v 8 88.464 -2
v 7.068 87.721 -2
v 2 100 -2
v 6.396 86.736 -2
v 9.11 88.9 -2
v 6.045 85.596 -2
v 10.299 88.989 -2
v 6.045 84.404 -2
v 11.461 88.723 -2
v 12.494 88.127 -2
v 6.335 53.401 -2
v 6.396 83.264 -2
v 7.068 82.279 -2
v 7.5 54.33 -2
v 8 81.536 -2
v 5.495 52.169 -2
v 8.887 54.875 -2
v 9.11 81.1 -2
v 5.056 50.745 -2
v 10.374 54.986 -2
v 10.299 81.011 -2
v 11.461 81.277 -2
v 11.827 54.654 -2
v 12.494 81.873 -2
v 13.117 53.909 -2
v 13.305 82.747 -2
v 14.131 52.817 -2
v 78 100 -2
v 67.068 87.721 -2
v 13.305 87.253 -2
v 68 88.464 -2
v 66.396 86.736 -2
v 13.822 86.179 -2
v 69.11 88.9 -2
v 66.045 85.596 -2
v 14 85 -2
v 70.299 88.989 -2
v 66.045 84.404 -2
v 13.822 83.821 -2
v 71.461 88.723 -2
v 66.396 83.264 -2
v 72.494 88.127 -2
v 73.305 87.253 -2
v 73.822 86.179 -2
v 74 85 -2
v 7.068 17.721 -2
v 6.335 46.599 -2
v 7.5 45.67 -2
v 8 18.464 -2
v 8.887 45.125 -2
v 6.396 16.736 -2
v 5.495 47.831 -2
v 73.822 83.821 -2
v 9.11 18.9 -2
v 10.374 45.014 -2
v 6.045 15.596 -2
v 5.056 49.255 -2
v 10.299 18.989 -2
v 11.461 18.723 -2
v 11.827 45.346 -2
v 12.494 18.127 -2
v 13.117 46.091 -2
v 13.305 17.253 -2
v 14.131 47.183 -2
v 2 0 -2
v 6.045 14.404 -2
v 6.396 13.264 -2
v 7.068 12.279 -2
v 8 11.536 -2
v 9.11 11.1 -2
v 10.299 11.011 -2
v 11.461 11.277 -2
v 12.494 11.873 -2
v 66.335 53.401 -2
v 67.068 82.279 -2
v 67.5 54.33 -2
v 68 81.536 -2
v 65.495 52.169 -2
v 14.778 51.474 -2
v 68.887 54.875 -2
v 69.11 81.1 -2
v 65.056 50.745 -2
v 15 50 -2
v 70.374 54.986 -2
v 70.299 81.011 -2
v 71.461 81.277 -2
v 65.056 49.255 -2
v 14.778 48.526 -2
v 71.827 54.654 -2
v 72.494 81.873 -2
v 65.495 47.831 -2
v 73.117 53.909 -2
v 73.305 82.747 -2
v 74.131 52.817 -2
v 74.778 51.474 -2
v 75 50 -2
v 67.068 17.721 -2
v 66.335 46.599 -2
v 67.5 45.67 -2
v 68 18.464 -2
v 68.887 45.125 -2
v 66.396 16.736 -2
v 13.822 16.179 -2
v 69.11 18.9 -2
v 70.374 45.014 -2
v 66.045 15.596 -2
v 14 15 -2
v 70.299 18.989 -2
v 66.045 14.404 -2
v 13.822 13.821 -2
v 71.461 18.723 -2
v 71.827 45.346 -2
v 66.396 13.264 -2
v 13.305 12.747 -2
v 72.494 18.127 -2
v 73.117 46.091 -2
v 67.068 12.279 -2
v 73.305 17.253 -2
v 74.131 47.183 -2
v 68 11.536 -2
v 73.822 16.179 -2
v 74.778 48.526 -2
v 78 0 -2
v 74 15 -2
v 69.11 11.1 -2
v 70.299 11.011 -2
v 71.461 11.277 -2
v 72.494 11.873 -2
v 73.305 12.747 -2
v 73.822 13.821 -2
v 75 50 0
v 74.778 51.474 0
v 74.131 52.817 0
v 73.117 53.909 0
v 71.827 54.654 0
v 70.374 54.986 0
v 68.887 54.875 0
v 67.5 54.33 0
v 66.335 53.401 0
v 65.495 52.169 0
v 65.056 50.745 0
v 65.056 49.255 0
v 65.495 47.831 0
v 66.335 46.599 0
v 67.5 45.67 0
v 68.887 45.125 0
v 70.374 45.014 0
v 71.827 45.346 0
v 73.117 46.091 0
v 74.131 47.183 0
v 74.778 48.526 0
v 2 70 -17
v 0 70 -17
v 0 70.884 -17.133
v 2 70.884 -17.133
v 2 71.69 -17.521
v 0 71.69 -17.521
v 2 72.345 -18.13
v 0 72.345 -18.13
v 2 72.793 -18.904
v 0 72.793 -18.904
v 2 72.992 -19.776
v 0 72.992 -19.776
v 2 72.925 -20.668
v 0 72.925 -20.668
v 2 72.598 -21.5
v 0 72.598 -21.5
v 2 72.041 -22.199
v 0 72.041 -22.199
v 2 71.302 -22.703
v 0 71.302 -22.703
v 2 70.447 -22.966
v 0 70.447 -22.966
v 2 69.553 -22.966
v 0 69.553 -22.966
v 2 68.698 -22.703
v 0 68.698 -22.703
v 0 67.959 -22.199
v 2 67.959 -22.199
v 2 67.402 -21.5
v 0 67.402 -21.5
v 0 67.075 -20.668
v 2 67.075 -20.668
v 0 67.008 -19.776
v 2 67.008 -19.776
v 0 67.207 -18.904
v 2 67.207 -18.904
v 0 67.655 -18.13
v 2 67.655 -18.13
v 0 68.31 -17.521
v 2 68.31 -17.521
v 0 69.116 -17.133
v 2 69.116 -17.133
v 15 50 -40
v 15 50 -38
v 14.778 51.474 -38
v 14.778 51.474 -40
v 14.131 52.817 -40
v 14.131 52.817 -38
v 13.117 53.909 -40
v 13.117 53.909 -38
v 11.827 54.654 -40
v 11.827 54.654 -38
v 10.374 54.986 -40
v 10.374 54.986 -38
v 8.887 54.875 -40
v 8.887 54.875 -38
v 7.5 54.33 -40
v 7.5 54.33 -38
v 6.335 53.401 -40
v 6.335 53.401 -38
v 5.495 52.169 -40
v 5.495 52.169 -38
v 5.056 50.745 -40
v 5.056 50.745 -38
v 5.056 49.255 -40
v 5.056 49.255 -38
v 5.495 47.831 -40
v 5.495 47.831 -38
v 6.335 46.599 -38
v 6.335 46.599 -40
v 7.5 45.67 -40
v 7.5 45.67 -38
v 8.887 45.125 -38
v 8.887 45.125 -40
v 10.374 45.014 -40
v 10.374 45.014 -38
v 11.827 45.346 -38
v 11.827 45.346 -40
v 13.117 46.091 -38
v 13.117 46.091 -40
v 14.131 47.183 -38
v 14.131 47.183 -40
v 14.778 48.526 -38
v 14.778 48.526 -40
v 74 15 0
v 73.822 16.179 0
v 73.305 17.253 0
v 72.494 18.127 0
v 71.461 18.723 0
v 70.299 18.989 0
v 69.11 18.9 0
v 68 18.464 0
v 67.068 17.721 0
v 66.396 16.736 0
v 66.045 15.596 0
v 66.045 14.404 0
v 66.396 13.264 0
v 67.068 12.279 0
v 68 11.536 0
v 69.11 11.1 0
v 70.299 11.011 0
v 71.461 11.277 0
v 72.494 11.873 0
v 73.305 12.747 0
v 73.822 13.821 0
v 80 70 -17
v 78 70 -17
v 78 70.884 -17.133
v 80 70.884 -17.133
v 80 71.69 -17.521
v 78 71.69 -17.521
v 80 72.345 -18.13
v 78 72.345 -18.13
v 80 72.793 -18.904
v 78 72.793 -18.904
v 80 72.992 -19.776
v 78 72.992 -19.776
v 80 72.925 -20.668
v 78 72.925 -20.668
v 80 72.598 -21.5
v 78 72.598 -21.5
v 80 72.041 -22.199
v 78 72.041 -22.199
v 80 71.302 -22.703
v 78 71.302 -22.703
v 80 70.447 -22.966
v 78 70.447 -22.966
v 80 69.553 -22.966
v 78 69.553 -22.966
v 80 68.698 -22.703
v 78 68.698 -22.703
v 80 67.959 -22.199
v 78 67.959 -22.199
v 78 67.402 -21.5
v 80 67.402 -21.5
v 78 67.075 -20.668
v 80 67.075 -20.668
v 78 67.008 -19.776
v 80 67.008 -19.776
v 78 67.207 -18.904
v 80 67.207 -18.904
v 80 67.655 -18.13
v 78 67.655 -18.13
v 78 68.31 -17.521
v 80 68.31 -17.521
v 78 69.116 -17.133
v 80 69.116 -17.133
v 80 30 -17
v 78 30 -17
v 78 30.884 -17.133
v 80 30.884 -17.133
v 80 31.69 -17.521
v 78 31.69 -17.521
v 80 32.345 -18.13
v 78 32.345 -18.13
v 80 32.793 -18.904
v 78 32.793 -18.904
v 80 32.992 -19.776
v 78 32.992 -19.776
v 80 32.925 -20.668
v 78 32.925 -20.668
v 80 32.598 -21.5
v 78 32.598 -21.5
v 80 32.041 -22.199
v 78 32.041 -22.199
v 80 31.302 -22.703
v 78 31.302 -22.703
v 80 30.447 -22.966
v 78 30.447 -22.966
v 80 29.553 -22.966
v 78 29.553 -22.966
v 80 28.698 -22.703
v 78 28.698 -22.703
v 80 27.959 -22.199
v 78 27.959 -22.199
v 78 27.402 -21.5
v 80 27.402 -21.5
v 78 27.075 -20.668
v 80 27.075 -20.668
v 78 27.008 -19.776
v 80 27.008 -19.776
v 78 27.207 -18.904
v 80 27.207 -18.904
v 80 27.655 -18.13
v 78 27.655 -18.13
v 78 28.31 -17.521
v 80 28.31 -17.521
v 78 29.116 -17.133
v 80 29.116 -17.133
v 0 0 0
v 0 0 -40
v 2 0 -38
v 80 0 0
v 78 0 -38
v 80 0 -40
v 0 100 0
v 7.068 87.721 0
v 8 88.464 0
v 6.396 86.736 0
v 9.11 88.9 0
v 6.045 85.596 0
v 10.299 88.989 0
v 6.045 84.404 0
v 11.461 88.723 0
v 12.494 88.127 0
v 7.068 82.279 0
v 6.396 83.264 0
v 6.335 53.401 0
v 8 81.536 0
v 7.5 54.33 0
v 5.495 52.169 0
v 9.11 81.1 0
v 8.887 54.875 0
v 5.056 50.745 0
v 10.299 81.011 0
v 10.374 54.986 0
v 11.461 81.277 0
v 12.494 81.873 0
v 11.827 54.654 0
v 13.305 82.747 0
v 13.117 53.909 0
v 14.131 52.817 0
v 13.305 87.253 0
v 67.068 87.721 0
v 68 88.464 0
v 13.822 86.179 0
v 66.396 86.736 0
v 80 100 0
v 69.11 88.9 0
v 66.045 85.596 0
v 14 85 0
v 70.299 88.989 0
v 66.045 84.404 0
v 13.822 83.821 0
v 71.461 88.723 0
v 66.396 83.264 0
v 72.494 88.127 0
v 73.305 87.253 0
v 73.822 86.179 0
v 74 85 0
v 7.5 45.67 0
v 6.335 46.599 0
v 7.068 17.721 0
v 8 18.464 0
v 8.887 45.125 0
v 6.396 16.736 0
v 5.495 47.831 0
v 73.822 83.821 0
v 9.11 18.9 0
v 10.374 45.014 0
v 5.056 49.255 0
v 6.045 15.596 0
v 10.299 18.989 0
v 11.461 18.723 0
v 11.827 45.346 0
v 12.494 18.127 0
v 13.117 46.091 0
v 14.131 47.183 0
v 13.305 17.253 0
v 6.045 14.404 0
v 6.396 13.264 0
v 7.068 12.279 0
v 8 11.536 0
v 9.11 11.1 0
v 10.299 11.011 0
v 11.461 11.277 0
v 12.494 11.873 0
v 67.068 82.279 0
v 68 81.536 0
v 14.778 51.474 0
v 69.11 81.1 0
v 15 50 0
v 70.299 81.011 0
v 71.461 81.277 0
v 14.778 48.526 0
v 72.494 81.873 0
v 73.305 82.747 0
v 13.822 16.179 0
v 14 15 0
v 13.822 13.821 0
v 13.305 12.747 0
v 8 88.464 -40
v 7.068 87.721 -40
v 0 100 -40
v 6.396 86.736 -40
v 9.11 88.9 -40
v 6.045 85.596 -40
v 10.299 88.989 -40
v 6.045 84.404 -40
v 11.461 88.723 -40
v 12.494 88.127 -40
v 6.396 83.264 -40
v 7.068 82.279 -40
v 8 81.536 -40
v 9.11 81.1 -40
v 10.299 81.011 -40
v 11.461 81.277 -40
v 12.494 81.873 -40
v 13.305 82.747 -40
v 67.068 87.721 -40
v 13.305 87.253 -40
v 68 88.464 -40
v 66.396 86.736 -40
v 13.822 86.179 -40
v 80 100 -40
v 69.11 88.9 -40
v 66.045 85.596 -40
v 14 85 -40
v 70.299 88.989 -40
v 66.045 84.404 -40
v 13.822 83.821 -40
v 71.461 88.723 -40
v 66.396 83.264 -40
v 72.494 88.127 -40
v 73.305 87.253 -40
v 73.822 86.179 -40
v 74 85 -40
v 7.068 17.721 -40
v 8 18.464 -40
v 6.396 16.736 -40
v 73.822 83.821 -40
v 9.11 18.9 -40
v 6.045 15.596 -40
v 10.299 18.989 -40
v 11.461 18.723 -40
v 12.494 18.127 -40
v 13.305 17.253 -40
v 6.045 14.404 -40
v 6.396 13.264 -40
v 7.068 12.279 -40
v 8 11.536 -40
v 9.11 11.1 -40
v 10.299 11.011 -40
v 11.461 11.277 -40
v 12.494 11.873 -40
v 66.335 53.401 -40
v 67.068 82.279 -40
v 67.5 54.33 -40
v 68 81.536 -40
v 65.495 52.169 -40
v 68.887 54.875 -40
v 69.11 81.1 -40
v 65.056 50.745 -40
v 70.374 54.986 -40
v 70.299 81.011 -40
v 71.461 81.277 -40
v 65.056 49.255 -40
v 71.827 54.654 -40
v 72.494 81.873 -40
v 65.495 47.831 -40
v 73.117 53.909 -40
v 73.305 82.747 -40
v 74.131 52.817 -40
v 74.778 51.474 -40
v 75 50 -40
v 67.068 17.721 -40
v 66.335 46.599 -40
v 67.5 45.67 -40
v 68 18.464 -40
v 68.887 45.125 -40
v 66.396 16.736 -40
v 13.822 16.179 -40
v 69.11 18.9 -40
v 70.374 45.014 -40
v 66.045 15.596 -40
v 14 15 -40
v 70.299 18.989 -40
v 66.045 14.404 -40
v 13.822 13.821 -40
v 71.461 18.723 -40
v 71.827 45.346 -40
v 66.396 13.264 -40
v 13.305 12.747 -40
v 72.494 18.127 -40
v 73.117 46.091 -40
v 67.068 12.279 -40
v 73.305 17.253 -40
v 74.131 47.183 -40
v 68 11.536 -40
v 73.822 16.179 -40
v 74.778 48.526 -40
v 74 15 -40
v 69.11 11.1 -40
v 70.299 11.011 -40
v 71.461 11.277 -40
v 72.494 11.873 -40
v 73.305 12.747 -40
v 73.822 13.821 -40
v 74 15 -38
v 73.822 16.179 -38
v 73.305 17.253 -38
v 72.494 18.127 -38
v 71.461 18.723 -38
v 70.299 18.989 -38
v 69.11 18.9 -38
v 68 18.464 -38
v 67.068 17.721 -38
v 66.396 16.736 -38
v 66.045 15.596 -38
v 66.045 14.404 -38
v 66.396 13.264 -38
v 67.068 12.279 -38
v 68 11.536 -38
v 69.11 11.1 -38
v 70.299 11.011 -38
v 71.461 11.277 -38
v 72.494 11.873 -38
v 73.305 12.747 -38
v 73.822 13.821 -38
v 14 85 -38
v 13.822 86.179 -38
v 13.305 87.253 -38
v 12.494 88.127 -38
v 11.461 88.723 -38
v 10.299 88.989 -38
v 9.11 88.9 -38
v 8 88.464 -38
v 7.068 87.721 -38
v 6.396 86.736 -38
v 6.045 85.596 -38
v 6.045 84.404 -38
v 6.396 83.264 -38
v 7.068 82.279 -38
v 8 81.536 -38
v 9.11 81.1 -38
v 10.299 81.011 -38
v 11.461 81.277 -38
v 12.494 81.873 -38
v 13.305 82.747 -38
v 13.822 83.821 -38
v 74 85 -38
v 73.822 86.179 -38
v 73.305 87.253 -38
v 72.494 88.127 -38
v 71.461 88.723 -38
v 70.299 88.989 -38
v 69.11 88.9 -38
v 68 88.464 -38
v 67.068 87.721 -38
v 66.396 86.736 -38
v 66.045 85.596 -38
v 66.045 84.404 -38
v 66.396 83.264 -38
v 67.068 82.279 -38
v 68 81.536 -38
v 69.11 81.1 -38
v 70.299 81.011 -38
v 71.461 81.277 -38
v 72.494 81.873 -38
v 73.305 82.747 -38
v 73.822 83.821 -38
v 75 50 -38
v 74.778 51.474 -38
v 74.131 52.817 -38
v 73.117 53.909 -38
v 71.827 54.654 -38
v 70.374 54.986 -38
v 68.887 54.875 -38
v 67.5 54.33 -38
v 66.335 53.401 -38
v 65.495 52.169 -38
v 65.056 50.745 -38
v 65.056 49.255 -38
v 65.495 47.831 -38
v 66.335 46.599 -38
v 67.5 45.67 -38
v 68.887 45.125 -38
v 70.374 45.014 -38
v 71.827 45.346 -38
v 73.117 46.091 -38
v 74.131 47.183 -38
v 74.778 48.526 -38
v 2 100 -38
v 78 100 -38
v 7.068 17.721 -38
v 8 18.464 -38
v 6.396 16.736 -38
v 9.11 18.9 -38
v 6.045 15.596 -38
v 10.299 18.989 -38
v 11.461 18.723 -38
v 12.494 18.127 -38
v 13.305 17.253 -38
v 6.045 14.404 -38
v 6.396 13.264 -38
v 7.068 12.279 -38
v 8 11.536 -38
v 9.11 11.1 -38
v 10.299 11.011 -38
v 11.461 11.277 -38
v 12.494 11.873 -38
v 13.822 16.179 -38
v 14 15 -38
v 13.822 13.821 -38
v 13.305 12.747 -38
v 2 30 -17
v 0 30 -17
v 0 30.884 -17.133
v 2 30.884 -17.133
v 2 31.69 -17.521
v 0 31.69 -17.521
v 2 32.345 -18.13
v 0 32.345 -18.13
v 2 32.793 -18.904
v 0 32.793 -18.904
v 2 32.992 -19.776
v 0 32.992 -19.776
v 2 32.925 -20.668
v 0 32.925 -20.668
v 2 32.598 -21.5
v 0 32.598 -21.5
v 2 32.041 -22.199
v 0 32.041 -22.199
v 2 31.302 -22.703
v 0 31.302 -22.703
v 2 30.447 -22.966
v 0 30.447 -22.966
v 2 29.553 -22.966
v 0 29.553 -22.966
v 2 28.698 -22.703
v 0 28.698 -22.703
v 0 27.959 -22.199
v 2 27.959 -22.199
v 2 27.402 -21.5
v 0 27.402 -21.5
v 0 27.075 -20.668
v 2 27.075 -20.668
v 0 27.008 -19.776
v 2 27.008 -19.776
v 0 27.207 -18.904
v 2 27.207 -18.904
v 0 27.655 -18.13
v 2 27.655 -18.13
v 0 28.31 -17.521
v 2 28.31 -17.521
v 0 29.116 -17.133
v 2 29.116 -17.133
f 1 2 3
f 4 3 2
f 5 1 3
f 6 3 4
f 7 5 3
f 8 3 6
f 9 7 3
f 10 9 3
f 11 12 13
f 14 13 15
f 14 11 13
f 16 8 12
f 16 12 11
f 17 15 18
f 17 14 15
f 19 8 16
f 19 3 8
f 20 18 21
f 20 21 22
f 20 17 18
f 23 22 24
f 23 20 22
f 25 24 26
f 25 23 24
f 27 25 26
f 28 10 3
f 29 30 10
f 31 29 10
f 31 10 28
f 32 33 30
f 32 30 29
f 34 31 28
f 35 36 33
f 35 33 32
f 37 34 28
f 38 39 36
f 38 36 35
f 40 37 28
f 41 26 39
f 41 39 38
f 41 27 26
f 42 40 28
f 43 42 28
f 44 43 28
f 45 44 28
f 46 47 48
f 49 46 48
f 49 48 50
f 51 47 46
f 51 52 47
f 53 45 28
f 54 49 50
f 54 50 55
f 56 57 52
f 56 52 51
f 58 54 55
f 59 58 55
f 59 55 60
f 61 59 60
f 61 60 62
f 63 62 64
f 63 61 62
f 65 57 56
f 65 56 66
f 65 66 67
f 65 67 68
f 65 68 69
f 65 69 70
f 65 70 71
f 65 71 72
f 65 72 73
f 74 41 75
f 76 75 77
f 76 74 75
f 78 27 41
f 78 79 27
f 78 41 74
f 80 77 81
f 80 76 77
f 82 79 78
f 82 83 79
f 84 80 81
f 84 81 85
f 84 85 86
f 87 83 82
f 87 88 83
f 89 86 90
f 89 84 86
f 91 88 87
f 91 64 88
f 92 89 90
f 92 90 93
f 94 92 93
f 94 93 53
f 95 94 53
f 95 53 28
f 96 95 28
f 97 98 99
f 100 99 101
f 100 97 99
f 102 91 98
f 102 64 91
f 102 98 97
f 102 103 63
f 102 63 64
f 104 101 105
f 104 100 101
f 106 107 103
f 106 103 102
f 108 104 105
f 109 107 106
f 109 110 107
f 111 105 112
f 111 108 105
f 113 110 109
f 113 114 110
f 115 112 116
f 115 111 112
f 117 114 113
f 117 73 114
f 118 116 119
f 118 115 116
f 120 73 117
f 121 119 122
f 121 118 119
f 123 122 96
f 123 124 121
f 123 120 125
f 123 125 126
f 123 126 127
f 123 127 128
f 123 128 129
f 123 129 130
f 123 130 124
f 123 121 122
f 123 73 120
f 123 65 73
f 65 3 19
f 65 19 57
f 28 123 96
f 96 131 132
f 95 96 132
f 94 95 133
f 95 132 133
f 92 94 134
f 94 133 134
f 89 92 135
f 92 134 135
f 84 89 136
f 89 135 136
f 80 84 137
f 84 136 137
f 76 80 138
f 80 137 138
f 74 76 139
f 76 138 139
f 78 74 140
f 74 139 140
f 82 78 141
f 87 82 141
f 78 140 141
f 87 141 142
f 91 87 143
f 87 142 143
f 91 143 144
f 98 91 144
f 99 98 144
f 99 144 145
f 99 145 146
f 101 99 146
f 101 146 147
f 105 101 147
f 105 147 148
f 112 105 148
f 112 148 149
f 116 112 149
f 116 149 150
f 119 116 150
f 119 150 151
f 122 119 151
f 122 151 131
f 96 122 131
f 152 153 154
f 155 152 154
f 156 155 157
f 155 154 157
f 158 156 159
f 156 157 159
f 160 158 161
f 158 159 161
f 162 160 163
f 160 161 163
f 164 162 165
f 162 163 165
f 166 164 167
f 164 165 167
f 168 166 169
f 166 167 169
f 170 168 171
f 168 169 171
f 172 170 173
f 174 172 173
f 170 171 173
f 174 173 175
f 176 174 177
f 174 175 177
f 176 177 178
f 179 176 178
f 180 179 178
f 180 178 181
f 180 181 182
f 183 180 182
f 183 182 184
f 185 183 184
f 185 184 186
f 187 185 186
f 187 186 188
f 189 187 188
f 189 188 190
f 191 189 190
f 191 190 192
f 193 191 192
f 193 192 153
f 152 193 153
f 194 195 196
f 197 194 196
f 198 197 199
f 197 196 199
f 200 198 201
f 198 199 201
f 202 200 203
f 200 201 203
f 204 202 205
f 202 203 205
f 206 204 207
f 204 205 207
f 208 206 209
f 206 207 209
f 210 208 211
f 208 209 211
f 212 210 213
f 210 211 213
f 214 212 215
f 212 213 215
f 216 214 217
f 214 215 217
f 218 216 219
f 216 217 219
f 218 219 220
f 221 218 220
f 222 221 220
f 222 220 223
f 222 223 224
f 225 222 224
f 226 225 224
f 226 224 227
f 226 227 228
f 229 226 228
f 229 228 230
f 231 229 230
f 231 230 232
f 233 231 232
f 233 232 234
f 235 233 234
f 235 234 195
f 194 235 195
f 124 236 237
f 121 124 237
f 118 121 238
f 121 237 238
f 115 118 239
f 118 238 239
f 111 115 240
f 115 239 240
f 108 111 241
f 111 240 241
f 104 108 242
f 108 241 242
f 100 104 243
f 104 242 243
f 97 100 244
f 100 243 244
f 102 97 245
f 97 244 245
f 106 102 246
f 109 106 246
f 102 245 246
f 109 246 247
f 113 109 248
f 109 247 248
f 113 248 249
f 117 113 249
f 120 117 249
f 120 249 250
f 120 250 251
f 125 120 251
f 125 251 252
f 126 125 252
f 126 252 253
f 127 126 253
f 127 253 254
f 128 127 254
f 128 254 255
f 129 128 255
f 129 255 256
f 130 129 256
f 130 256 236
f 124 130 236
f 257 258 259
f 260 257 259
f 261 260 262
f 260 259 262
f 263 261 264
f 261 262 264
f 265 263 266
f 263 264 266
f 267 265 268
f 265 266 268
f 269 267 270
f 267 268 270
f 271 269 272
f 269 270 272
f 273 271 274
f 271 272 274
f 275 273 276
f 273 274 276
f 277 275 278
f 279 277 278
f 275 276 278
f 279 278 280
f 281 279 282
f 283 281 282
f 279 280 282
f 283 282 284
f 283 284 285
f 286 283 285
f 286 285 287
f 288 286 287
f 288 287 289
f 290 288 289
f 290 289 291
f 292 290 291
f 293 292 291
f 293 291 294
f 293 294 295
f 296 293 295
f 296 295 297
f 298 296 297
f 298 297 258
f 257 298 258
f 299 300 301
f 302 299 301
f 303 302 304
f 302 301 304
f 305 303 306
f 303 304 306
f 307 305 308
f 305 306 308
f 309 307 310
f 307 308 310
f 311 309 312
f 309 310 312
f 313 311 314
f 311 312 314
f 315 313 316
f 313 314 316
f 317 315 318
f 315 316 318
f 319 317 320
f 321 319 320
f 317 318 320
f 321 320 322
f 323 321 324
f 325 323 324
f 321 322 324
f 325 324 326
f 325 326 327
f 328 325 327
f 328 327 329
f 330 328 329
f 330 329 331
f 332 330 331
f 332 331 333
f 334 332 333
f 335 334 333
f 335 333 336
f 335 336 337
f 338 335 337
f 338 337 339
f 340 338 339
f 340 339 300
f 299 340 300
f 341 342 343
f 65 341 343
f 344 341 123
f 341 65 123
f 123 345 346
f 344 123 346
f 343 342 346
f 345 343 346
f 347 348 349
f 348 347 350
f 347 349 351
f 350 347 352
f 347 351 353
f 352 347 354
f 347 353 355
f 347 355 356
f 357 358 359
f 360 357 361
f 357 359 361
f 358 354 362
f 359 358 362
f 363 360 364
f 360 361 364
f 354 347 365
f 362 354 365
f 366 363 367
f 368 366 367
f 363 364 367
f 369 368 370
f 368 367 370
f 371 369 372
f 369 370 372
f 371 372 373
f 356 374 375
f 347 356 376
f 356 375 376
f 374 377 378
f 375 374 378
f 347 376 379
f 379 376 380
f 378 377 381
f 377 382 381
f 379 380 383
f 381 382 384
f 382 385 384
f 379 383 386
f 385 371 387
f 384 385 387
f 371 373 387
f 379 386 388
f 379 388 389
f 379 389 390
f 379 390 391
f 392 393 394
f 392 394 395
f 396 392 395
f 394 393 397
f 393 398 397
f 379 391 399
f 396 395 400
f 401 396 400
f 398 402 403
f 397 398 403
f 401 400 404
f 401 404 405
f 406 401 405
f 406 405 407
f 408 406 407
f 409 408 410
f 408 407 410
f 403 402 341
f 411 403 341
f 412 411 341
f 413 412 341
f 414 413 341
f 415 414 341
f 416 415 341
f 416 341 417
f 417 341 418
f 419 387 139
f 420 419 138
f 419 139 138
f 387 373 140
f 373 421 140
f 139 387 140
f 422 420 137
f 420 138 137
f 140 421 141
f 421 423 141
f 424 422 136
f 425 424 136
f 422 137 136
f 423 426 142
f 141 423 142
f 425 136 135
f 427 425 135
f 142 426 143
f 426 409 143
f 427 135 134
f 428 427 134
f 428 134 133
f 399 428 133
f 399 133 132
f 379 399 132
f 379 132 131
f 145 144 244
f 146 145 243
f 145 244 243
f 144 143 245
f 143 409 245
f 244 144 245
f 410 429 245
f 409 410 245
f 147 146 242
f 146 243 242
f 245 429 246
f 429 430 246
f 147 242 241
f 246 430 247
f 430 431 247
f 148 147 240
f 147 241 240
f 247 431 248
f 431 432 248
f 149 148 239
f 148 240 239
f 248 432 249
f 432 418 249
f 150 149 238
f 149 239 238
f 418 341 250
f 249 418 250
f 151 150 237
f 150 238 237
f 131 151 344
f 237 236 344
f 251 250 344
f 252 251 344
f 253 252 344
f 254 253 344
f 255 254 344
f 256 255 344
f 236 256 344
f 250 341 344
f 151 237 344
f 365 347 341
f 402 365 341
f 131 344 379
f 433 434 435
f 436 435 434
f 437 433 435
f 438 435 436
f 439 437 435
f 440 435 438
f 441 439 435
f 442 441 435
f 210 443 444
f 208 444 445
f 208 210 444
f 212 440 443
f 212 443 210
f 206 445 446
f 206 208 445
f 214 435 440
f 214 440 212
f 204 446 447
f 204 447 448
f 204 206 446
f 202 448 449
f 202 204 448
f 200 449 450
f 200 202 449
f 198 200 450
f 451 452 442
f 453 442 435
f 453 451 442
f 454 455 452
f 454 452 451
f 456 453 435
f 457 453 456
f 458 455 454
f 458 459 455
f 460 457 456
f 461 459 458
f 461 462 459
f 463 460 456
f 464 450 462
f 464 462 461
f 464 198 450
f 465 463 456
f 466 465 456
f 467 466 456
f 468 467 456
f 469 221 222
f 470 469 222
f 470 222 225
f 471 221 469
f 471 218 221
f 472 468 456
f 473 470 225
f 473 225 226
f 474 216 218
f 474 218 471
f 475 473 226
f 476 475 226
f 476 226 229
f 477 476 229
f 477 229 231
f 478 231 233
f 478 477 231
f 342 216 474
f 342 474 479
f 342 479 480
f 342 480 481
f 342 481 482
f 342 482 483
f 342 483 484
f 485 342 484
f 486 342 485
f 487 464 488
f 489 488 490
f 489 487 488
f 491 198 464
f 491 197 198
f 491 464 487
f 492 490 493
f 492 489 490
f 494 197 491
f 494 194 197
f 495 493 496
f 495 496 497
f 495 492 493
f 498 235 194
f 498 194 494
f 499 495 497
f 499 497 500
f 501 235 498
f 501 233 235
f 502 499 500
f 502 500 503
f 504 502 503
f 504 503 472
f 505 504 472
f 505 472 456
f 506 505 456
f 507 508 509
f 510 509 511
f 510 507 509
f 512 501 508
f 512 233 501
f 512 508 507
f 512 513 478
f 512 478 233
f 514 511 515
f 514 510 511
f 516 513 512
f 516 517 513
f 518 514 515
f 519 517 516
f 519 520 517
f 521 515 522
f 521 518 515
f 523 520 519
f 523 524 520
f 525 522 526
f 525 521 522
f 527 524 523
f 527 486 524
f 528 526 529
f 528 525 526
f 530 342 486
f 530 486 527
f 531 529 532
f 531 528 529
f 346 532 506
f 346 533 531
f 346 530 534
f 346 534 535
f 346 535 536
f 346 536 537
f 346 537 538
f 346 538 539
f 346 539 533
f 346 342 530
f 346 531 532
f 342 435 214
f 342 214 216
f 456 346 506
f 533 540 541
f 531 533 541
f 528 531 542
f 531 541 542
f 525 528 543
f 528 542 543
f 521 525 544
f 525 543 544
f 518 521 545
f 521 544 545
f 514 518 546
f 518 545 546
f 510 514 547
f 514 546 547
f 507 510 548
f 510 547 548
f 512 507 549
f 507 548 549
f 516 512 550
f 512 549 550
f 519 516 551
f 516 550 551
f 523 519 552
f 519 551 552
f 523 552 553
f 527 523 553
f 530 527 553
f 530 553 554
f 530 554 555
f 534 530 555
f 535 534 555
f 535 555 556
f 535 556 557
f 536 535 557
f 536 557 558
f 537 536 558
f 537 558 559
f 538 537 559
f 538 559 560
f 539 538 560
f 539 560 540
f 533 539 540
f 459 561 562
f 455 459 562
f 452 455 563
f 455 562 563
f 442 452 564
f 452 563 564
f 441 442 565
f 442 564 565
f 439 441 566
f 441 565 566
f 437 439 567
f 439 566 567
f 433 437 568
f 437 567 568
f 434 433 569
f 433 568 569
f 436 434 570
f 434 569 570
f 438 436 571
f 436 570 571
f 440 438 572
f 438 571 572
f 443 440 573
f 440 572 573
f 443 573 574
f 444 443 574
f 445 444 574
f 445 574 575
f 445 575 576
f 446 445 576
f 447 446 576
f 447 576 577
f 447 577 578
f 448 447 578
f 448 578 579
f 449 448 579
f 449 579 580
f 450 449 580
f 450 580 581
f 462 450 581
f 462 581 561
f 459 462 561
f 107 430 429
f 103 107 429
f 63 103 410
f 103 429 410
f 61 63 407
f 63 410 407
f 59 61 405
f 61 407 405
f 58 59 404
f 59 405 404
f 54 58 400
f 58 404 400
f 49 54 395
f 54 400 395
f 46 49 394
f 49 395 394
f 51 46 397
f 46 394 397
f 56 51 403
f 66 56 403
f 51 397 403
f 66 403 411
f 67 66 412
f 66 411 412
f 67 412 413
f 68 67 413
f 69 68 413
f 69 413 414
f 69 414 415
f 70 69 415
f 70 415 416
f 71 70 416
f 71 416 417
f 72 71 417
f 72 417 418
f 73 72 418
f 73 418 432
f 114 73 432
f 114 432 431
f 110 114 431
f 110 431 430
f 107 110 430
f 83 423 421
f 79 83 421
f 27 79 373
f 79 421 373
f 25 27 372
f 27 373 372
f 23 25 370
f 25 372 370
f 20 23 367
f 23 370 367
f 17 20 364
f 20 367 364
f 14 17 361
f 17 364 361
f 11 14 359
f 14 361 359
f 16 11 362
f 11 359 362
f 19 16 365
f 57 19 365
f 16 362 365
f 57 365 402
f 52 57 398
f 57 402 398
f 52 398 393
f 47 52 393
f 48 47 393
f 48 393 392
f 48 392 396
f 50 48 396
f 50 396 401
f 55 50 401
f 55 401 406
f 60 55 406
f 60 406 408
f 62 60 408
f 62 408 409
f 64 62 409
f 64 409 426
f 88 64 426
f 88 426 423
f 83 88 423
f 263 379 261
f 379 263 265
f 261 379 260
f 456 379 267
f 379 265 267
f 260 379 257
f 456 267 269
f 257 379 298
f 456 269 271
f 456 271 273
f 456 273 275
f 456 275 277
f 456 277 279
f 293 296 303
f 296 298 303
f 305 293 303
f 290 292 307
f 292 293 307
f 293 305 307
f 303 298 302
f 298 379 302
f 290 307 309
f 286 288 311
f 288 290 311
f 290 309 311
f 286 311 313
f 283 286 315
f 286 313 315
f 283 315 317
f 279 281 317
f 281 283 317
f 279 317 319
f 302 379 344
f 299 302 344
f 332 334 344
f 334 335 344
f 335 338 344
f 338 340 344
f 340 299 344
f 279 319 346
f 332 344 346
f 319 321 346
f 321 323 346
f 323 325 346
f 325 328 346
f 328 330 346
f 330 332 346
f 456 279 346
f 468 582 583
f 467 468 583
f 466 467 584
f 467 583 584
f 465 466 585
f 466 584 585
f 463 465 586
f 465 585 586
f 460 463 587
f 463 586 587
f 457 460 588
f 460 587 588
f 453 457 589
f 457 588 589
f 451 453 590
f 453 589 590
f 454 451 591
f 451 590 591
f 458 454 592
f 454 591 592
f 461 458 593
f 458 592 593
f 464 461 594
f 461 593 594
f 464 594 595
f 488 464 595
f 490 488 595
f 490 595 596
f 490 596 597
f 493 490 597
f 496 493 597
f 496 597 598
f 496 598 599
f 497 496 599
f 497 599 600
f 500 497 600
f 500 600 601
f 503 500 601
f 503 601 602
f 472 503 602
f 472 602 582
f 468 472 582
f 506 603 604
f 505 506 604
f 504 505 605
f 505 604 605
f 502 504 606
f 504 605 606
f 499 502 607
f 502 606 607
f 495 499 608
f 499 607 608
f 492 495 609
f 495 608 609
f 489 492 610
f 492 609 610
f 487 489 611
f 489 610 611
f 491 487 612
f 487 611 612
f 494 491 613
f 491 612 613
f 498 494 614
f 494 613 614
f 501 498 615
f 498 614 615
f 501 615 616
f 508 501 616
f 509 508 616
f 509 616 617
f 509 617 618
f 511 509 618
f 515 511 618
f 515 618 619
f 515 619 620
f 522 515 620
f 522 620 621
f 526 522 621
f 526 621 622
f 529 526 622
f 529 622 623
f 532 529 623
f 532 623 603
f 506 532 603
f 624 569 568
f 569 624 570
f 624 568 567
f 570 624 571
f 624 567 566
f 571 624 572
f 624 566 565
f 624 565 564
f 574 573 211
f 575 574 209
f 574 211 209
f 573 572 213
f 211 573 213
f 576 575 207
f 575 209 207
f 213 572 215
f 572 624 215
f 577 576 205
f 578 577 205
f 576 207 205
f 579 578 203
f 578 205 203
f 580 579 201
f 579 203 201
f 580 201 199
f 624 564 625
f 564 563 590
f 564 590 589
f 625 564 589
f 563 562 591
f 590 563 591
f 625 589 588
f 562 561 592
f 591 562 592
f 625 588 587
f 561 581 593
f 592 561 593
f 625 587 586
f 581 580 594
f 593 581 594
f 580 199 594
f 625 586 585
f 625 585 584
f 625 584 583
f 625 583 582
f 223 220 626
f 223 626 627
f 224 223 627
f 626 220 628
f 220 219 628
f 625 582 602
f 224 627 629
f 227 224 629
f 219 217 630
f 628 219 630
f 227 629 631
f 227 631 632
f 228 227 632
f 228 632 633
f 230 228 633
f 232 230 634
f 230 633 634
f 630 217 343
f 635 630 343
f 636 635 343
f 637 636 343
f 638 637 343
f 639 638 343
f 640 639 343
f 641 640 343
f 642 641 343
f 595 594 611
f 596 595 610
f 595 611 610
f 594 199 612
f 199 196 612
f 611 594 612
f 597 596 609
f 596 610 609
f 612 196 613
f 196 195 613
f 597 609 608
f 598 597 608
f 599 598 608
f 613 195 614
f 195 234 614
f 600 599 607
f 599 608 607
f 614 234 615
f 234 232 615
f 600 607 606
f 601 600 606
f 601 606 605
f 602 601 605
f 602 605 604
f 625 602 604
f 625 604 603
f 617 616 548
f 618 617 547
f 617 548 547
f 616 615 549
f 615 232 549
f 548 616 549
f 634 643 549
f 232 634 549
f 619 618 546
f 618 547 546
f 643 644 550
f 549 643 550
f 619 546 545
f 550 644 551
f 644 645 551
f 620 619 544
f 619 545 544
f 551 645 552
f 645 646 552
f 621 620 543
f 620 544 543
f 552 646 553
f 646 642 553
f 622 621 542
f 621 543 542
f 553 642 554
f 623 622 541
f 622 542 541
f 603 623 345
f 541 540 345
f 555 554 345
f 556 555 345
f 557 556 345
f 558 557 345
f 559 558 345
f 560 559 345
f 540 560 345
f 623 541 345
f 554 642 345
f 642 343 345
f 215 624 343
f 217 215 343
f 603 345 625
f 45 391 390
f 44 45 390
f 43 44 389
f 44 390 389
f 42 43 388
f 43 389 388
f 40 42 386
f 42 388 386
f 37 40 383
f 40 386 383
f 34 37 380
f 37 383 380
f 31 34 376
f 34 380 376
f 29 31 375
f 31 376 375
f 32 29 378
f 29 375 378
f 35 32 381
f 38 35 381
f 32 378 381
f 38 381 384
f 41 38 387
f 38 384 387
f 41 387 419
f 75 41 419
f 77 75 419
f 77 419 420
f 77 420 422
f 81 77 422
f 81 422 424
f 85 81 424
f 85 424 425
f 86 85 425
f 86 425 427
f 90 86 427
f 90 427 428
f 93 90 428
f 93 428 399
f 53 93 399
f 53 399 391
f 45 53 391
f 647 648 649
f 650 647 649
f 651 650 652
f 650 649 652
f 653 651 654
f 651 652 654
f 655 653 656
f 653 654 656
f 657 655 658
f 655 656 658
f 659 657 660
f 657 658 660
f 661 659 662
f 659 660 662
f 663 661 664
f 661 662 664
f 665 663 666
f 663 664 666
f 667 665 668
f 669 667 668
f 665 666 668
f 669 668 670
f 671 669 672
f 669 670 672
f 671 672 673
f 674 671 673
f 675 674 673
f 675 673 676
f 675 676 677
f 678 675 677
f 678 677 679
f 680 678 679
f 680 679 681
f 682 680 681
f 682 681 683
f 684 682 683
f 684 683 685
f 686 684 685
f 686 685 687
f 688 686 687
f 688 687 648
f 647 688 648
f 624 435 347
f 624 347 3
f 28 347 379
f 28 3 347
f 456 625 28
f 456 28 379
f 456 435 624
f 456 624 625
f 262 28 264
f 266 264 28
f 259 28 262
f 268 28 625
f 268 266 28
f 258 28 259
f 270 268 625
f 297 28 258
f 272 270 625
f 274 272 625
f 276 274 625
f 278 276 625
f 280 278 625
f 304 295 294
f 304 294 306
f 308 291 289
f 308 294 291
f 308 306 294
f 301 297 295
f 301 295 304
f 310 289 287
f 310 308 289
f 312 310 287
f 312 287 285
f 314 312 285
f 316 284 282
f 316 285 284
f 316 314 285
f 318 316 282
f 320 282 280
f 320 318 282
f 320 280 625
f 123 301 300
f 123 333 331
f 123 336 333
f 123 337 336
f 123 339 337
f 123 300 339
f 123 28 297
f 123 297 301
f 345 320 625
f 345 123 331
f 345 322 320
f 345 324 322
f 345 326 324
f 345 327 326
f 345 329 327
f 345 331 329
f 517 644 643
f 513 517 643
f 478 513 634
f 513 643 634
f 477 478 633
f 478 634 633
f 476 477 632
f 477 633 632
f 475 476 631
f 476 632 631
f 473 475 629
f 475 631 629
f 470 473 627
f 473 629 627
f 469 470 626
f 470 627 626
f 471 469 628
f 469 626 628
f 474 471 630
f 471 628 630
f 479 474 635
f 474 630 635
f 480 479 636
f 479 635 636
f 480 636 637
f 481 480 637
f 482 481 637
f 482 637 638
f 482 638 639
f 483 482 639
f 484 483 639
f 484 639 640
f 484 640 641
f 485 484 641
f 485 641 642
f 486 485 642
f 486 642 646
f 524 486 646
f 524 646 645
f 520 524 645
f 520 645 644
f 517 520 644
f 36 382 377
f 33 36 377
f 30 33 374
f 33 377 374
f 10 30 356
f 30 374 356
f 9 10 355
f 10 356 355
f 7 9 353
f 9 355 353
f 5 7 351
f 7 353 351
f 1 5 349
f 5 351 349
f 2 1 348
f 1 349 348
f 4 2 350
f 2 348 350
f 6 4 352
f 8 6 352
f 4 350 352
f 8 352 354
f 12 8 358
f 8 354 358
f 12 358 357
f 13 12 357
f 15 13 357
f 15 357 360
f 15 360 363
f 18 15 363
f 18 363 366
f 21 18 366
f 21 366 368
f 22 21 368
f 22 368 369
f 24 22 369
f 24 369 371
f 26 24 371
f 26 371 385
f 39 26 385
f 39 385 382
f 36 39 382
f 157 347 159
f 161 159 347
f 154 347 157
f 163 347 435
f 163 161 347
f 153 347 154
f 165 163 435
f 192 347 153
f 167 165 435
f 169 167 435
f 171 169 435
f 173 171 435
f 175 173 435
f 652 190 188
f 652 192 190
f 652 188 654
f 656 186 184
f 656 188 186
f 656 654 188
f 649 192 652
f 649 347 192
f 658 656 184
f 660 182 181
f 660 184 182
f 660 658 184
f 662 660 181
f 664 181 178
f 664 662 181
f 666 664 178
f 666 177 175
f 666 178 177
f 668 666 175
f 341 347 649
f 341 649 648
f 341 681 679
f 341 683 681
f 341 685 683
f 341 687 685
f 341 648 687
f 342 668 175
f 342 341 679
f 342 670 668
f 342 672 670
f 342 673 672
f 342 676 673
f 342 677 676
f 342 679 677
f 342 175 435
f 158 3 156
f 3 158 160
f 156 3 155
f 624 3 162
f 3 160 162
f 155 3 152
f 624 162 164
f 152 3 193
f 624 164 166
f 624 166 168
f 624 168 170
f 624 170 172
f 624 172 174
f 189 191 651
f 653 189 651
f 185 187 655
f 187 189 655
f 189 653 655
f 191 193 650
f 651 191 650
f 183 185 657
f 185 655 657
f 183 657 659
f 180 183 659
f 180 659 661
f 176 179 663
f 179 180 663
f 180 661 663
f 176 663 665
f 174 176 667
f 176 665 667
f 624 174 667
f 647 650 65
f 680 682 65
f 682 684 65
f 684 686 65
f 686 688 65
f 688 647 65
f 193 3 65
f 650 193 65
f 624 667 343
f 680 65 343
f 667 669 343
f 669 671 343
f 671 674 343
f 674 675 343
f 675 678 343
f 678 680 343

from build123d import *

# Parameters (mm, degrees)
SKETCH1_W           = 80
SKETCH1_H           = 40
SKETCH1_W_2         = 76
SKETCH1_H_2         = 36
BOSS_EXTRUDE1_DEPTH = 100
SKETCH2_R           = 4
SKETCH2_R_2         = 5
CUT_EXTRUDE1_DEPTH  = 40
SKETCH3_R           = 3
CUT_EXTRUDE2_DEPTH  = 80


with BuildPart() as part:
    # Sketch1 → Boss-Extrude1 (new body)
    with BuildSketch(Plane(origin=(0, 0, 0), x_dir=(1, 0, 0), z_dir=(0, 1, 0))):
        with Locations((40, 20)):
            Rectangle(SKETCH1_W, SKETCH1_H)
        with Locations((40, 20)):
            Rectangle(SKETCH1_W_2, SKETCH1_H_2, mode=Mode.SUBTRACT)
    extrude(amount=BOSS_EXTRUDE1_DEPTH)

    # Sketch2 → Cut-Extrude1 (cut)
    with BuildSketch(Plane.XY):
        with Locations((70, 15)):
            Circle(SKETCH2_R)
        with Locations((70, 85)):
            Circle(SKETCH2_R)
        with Locations((10, 15)):
            Circle(SKETCH2_R)
        with Locations((10, 50)):
            Circle(SKETCH2_R_2)
        with Locations((10, 85)):
            Circle(SKETCH2_R)
        with Locations((70, 50)):
            Circle(SKETCH2_R_2)
    extrude(amount=-CUT_EXTRUDE1_DEPTH, mode=Mode.SUBTRACT)

    # Sketch3 → Cut-Extrude2 (cut)
    with BuildSketch(Plane.ZY):
        with Locations((-20, 30)):
            Circle(SKETCH3_R)
        with Locations((-20, 70)):
            Circle(SKETCH3_R)
    extrude(amount=-CUT_EXTRUDE2_DEPTH, mode=Mode.SUBTRACT)


solid = part.part
